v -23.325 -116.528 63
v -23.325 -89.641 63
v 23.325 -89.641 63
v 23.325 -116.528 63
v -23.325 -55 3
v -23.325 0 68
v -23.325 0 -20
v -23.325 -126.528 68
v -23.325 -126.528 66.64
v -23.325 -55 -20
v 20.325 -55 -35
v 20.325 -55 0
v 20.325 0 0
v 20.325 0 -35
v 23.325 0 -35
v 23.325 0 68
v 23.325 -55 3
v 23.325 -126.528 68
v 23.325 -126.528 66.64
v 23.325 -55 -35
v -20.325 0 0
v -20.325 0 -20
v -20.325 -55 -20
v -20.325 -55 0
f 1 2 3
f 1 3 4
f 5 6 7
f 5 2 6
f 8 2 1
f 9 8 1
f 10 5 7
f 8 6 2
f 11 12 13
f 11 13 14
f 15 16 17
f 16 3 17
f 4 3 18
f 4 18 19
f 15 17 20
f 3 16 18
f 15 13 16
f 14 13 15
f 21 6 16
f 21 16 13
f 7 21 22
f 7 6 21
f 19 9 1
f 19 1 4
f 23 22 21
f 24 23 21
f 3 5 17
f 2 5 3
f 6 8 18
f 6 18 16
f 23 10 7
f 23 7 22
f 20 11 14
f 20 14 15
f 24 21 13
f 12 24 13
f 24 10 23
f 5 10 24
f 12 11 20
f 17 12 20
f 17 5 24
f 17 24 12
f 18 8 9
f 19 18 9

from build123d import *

# Parameters (mm, degrees)
PAD_DEPTH     = 55
PAD001_DEPTH  = 46.65
SKETCH003_W   = 5
SKETCH003_H   = 50
PAD002_DEPTH  = 46.65
PAD003_DEPTH  = 46.65
CHAMFER_ANGLE = 20
CHAMFER_SIZE  = 10


with BuildPart() as part:
    # Sketch → Pad (new body)
    with BuildSketch(Plane.XZ):
        Polygon((-23.325, 3), (-23.325, -20), (-20.325, -20), (-20.325, 0), (20.325, 0), (20.325, -35), (23.325, -35), (23.325, 3), align=None)
    extrude(amount=PAD_DEPTH)

    # Sketch001 (on Face1 of Pad) → Pad001 (join)
    with BuildSketch(Plane(origin=(-23.325, 0, 0), x_dir=(0, 0, -1), z_dir=(-1, 0, 0))):
        Polygon((-3, 39), (-3, 55), (-68, 92.527767), (-68, 76.527767), align=None)
    extrude(amount=-PAD001_DEPTH)

    # Sketch003 (on Face12 of Pad001) → Pad002 (join)
    with BuildSketch(Plane(origin=(-23.325, 0, 0), x_dir=(0, 0, -1), z_dir=(-1, 0, 0))):
        with Locations((-65.5, 101.527767)):
            Rectangle(SKETCH003_W, SKETCH003_H)
    extrude(amount=-PAD002_DEPTH)

    # Sketch004 (on DatumPlane) → Pad003 (join)
    with BuildSketch(Plane(origin=(-23.325, 0, 0), x_dir=(0, 0, -1), z_dir=(-1, 0, 0))):
        Polygon((-68, 0), (-3, 0), (-3, 39), (-68, 76.527767), align=None)
    extrude(amount=-PAD003_DEPTH)

    # Chamfer
    chamfer_edges = [part.edges().sort_by_distance(p)[0] for p in [
        (0, -126.527767, 63),
    ]]
    chamfer_side = part.faces().sort_by_distance((0, -108.084392, 63))[0]
    chamfer(chamfer_edges, length=CHAMFER_SIZE, angle=CHAMFER_ANGLE, reference=chamfer_side)


solid = part.part
